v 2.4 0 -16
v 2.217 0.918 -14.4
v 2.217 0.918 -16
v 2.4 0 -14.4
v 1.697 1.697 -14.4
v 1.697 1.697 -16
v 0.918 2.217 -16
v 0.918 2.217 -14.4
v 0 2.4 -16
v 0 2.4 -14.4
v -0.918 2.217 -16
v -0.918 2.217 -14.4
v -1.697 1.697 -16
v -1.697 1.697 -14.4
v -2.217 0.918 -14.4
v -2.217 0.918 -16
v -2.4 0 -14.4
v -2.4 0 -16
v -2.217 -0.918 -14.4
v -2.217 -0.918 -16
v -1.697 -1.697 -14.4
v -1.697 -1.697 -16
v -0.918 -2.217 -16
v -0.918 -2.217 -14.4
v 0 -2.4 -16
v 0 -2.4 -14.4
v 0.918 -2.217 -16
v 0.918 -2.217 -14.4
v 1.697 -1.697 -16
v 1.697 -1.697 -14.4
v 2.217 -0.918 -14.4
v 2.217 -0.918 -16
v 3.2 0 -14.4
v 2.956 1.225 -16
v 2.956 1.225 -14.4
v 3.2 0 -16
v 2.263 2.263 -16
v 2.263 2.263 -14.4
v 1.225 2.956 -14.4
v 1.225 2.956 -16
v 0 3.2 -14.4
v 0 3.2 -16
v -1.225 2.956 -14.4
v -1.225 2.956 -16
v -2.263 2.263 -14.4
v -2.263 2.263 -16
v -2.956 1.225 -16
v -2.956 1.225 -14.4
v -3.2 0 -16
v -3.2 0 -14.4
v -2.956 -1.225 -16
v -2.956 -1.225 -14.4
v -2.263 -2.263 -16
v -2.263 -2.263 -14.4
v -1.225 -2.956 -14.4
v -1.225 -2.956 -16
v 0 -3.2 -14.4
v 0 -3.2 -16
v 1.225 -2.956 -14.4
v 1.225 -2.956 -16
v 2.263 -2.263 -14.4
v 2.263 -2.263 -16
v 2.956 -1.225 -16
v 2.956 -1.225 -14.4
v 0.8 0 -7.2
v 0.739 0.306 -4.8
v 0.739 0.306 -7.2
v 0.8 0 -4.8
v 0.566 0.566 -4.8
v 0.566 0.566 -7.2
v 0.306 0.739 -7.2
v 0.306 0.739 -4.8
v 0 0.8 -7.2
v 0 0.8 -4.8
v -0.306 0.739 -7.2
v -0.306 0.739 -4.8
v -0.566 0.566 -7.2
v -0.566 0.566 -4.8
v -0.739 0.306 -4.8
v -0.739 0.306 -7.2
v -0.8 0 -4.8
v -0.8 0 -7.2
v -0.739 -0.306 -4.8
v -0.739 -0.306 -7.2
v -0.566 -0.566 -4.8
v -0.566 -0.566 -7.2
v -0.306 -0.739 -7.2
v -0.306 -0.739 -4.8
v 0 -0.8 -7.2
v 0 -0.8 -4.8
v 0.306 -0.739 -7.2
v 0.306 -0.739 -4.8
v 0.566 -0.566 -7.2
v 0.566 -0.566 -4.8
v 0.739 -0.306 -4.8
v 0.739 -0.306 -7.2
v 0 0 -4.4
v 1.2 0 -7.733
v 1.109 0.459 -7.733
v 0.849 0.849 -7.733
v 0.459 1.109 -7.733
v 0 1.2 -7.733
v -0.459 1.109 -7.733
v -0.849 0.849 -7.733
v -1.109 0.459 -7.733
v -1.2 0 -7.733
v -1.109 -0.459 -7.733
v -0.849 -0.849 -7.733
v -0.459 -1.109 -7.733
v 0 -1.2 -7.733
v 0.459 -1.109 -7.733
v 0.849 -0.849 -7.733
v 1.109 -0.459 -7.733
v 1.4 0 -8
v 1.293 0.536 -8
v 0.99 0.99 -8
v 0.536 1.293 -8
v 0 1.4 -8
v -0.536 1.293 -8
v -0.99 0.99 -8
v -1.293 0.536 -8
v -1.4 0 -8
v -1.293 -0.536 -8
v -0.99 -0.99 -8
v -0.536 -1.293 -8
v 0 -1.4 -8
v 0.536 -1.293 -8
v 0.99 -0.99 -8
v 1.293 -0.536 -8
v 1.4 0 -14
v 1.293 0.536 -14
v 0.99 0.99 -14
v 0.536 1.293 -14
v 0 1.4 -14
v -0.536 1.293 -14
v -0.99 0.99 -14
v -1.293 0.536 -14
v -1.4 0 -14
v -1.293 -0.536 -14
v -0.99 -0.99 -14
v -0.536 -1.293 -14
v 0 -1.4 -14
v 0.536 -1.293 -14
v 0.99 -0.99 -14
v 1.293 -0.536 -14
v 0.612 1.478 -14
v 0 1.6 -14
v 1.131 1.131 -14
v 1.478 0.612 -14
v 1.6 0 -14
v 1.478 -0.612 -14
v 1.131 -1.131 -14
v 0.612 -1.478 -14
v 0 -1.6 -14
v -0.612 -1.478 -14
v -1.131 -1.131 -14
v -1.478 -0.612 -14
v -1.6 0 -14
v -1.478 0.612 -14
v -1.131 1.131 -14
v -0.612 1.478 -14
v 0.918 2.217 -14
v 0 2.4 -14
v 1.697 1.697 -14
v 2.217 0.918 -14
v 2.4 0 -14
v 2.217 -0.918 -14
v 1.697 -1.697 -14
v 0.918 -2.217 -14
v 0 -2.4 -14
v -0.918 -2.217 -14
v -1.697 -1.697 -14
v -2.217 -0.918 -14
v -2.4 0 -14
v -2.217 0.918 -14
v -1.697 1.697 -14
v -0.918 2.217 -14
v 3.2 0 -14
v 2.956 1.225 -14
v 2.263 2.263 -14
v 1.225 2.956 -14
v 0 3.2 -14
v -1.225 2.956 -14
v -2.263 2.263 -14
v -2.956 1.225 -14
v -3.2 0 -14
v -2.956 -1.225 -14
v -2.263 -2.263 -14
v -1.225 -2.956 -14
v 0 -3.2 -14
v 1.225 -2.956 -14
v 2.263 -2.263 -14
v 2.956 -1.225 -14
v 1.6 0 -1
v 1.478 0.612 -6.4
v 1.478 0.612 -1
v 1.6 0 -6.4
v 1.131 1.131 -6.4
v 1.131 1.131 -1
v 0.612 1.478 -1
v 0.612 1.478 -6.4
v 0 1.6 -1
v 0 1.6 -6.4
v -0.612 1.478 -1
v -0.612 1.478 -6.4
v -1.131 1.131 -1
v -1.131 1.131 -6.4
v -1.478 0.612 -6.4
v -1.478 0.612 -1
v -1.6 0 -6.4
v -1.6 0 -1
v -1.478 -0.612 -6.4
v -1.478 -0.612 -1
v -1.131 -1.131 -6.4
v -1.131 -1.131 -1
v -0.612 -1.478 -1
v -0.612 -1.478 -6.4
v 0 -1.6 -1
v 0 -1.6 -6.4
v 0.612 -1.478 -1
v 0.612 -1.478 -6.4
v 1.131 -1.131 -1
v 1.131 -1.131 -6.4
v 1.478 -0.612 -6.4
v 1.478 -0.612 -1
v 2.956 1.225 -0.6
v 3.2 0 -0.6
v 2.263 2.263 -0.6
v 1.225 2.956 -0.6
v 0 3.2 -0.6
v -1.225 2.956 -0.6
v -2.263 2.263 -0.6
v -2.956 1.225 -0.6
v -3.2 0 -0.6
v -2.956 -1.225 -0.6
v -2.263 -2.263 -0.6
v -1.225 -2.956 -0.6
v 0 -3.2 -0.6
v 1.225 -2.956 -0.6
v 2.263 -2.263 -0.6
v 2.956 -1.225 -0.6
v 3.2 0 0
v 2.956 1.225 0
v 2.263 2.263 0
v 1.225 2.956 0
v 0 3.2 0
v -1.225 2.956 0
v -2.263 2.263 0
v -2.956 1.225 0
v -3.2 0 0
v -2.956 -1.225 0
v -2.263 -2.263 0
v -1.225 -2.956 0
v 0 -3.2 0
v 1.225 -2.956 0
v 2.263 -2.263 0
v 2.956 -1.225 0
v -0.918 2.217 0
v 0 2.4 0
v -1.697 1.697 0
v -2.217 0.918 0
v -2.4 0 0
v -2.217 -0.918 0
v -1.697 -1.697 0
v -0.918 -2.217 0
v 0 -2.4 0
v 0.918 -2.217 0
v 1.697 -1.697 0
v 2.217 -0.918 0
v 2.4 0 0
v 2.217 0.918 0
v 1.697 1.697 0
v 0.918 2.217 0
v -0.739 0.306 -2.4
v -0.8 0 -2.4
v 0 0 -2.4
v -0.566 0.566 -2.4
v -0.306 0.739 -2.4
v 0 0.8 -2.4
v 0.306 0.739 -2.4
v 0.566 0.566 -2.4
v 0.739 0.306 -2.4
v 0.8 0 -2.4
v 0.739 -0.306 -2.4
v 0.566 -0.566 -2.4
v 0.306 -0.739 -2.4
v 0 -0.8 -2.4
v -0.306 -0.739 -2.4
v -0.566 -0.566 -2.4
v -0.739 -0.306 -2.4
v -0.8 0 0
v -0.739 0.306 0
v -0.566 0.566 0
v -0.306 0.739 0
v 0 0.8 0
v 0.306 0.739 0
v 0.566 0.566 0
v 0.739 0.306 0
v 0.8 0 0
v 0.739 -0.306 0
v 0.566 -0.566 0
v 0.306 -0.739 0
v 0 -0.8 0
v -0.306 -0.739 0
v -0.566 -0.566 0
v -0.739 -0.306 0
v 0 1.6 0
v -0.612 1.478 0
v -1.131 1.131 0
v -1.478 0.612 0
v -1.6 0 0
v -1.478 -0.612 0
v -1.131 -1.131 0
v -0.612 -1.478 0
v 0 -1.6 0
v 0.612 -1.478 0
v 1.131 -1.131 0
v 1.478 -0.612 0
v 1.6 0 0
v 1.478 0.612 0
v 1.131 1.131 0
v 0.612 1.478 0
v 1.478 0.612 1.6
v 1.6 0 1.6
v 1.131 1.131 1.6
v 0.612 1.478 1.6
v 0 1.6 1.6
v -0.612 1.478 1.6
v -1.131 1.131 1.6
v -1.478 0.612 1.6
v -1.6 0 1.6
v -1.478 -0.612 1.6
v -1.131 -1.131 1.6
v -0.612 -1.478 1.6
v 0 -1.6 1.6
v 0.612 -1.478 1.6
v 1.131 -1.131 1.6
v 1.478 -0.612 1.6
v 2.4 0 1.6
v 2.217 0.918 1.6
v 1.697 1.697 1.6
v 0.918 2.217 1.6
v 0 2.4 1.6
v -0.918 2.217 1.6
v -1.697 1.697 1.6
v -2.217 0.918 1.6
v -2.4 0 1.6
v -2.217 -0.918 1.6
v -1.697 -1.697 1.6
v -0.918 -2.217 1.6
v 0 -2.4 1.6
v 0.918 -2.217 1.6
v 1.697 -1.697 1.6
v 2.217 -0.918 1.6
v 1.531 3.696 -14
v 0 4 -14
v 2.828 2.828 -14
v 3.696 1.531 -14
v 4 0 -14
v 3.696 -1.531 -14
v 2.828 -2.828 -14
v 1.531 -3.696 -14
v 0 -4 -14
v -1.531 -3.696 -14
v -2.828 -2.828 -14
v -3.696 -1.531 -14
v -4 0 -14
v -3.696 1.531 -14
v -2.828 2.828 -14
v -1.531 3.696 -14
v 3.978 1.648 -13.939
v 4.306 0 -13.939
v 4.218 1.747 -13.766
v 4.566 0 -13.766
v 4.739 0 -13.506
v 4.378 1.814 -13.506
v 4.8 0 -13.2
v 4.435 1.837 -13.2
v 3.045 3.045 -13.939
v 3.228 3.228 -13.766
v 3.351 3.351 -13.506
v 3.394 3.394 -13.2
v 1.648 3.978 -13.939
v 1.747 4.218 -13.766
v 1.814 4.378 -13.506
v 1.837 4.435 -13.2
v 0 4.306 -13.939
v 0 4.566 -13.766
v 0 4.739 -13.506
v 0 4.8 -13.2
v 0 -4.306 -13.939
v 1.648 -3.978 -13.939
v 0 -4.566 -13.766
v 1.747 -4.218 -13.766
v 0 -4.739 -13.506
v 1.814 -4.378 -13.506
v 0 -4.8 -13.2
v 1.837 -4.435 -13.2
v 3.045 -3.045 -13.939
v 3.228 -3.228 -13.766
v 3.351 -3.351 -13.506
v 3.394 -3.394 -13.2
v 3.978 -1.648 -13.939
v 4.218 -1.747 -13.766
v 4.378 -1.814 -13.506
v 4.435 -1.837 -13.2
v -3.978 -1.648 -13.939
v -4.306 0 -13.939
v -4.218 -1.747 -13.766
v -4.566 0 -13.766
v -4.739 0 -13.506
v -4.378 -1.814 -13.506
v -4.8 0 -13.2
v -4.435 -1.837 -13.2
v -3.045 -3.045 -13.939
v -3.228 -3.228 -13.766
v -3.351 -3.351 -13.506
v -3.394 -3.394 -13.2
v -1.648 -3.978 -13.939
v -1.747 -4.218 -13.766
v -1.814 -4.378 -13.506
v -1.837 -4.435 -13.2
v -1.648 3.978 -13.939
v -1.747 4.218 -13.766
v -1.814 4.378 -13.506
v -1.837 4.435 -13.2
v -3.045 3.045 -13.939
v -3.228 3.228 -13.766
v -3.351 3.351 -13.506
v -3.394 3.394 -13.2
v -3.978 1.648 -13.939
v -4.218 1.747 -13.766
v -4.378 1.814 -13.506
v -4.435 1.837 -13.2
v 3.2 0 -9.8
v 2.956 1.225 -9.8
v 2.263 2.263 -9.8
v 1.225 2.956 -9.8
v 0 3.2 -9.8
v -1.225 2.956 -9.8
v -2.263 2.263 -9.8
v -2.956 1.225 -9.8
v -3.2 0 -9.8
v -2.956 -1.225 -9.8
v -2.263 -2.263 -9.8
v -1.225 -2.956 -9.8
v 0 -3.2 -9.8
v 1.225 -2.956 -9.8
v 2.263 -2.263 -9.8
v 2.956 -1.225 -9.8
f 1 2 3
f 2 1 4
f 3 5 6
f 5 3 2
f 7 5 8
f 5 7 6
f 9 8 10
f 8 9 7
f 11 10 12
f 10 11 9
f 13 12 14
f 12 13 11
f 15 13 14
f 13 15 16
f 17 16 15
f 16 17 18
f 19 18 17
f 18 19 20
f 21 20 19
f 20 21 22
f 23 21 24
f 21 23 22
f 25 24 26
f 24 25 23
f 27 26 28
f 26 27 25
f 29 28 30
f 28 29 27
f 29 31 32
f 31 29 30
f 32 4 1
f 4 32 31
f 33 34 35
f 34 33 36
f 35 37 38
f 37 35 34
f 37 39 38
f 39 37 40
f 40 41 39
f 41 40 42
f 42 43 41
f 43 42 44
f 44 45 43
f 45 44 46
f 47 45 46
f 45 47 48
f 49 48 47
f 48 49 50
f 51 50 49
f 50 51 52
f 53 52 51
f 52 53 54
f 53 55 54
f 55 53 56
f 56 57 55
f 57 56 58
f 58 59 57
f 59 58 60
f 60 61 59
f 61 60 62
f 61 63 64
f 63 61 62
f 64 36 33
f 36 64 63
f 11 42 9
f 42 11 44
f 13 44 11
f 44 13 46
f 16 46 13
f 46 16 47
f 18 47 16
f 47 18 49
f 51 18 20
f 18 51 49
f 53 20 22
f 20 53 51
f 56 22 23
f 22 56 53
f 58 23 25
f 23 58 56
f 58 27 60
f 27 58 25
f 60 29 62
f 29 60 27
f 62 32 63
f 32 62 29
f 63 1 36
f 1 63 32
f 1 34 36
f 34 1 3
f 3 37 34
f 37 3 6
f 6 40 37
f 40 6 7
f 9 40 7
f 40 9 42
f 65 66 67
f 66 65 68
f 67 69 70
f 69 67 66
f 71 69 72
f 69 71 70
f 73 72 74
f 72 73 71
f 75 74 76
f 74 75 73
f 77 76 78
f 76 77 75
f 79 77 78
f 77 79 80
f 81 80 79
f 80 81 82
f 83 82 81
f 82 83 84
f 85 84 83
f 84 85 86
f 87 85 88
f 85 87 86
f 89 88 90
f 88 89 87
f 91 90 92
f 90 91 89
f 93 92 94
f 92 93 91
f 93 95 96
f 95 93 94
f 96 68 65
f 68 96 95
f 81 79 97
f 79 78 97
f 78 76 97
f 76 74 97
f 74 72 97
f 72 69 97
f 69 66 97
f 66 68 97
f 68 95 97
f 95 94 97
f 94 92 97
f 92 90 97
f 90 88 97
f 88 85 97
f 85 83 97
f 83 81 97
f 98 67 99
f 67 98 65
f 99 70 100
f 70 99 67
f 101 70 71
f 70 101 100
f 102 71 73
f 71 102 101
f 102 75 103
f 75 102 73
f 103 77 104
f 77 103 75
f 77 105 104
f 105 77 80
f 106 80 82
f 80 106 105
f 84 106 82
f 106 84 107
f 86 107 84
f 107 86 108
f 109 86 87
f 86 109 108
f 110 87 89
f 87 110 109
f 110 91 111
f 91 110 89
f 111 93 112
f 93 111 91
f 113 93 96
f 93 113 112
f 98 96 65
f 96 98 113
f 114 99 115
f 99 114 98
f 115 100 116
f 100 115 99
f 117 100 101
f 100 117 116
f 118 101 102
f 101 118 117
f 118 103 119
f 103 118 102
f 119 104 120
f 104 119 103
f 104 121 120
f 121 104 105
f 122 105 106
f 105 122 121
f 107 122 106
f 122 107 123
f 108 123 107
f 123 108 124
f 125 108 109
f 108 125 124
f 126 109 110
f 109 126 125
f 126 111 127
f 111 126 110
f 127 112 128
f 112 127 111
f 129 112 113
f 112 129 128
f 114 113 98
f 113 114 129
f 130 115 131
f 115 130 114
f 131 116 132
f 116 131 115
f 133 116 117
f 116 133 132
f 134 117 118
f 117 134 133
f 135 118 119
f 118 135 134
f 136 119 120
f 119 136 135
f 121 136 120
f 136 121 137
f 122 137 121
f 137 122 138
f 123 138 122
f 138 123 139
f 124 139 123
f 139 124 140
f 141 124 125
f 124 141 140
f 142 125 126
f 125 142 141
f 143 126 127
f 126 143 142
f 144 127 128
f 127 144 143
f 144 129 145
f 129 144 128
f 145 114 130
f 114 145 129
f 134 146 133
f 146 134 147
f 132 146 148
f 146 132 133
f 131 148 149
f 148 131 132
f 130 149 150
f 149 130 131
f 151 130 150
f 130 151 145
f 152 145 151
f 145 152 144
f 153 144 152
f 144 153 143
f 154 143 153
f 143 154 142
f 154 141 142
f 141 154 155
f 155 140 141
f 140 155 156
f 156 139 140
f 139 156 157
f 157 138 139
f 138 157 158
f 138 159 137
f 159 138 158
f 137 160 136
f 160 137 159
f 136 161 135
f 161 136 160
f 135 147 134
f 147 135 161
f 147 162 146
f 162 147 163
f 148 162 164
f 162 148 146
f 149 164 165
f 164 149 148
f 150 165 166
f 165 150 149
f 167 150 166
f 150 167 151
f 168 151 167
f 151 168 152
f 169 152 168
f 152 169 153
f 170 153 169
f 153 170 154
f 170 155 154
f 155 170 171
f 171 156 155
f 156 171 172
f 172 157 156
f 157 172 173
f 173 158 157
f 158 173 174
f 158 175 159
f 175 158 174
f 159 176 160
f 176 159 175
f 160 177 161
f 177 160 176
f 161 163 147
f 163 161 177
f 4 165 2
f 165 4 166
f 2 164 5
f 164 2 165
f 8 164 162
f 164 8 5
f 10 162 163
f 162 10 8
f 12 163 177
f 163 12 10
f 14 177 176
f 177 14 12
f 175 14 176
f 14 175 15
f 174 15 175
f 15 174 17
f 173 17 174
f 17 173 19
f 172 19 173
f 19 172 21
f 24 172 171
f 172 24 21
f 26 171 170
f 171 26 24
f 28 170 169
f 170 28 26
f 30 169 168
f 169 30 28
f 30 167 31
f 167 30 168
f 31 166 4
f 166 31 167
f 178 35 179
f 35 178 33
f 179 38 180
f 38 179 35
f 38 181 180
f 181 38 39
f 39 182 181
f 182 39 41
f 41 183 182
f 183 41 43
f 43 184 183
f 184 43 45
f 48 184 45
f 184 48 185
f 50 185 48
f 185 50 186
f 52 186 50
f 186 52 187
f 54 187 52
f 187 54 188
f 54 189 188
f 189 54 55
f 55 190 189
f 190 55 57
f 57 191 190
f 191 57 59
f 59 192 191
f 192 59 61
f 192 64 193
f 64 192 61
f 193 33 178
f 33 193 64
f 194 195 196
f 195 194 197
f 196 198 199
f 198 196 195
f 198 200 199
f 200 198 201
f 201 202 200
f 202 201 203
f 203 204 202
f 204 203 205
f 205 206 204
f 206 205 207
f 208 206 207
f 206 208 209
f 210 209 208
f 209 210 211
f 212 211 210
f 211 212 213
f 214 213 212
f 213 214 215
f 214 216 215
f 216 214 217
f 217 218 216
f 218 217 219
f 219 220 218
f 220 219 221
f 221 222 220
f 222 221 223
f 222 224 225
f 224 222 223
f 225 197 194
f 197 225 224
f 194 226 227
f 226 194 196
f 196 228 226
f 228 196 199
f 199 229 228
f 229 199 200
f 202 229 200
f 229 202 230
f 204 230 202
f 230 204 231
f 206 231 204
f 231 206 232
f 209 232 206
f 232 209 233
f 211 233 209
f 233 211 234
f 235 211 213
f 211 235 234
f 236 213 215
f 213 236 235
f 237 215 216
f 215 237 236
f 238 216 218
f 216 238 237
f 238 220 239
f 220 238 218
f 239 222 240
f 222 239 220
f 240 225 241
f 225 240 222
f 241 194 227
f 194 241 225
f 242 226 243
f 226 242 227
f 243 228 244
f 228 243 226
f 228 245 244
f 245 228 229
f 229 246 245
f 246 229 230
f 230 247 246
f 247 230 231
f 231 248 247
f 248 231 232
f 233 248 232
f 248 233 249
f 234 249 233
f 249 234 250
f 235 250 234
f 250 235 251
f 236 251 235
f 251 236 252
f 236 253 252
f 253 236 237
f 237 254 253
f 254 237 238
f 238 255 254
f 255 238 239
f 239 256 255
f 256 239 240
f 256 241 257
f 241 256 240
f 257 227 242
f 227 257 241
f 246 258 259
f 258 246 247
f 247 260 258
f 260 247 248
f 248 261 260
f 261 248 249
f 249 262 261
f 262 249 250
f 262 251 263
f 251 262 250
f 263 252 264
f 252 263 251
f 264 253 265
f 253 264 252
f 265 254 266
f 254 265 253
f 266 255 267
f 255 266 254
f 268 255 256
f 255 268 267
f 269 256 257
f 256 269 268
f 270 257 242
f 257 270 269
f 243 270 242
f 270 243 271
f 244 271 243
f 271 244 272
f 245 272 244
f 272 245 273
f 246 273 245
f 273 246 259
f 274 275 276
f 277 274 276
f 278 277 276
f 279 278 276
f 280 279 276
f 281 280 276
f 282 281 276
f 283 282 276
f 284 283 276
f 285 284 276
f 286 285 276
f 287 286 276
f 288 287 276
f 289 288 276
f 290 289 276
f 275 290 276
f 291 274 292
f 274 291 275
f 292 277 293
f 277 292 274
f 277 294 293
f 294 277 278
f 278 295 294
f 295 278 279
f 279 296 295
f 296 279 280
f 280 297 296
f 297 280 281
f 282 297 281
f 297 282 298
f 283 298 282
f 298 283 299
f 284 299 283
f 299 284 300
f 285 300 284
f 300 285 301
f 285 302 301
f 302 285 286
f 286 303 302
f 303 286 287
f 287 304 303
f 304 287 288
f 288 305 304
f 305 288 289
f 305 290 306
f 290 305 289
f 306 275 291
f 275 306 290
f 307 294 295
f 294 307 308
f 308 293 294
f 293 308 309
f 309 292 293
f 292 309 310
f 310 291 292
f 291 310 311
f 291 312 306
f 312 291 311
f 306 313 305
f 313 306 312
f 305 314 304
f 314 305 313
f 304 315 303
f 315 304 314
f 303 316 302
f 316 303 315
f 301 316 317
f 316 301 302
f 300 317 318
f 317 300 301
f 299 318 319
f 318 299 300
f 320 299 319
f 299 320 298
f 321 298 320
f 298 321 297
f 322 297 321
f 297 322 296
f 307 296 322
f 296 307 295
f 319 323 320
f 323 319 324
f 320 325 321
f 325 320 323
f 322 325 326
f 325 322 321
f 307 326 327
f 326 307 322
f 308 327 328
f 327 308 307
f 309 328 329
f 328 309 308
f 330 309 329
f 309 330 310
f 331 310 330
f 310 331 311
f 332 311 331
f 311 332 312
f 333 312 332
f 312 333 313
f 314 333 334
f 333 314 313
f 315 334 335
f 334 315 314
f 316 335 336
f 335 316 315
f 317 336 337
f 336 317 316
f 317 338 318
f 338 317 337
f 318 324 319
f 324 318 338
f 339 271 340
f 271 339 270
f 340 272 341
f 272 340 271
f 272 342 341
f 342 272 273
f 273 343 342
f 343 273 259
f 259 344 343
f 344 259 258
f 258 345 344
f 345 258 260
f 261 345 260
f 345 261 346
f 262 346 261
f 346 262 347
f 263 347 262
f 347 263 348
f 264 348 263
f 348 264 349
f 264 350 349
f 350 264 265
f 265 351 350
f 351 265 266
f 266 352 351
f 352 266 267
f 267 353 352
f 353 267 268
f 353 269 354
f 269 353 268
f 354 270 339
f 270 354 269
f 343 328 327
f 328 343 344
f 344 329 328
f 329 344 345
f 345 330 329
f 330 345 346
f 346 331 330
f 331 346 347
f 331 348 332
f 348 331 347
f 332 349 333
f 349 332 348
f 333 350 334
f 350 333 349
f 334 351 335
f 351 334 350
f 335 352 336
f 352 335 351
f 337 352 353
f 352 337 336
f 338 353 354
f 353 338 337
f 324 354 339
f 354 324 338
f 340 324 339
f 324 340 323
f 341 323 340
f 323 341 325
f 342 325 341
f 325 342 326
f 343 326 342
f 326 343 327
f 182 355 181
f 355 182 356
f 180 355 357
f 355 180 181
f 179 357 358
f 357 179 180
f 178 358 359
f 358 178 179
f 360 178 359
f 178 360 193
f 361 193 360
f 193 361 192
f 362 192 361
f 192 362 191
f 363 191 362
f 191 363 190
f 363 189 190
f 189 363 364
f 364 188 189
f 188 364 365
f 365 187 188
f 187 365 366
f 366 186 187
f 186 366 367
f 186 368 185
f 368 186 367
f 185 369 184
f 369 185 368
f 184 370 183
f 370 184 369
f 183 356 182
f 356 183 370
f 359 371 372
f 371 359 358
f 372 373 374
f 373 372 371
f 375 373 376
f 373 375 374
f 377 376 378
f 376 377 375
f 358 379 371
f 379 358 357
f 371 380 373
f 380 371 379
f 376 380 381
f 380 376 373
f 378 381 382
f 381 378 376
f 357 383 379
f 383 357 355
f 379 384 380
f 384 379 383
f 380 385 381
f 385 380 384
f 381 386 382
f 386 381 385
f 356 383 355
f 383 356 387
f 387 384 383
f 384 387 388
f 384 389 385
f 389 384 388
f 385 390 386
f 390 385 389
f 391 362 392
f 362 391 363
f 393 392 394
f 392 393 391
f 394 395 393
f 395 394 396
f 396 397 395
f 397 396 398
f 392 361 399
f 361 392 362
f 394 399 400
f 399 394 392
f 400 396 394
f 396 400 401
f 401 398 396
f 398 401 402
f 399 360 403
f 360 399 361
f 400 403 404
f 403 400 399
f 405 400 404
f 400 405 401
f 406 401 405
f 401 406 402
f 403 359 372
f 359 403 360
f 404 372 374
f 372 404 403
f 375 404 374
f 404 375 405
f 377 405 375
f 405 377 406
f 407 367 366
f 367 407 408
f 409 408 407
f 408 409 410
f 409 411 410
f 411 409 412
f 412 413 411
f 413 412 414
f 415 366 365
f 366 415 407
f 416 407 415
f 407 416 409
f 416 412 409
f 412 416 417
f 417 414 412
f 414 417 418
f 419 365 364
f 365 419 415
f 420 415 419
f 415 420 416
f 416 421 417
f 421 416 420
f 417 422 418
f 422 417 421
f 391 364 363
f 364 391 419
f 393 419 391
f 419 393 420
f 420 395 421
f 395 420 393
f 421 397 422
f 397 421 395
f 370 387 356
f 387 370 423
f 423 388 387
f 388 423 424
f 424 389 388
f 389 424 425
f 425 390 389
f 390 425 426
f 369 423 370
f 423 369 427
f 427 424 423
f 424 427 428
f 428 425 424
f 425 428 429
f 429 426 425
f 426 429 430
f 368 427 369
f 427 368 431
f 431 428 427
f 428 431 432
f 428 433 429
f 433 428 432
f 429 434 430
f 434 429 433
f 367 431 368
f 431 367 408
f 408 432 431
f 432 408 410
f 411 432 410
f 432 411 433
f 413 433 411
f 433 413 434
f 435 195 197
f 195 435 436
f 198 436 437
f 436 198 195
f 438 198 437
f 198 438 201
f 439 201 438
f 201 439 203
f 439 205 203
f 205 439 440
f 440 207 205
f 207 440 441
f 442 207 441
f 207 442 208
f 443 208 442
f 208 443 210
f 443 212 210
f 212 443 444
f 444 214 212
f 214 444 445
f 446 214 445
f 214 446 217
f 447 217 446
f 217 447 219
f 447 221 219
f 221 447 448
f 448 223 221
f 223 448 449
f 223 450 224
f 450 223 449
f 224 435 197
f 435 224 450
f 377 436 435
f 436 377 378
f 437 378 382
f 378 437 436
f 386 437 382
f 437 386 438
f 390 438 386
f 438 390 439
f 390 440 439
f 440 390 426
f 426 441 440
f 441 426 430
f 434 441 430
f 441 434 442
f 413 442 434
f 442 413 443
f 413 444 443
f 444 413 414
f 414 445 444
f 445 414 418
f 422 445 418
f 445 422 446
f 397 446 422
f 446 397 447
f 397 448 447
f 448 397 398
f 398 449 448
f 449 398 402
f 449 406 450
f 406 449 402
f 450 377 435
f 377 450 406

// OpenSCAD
use <../lib.scad>
use <s/u9180s01.scad>
use <s/u9180s02.scad>
function ldraw_lib__93549() = [
// 0 ~_Minifig Conical Flask [47/35] (Obsolete)
// 0 Name: 93549.dat
// 0 Author: Magnus Forsberg [MagFors]
// 0 !LDRAW_ORG Part Physical_Colour UPDATE 2019-02
// 0 !LICENSE Licensed under CC BY 4.0 : see CAreadme.txt
// 
// 0 BFC CERTIFY CCW
  [0,"BFC","CERTIFY"],
  [0,"BFC","CCW"],
// 
// 0 !CATEGORY Obsolete
// 
// 0 !HISTORY 2011-06-13 [cwdee] Rework nomenclature
// 0 !HISTORY 2012-01-25 [MagFors] Inlined hardcoded subfiles
// 0 !HISTORY 2012-08-09 [PTadmin] Official Update 2012-02
// 0 !HISTORY 2012-08-11 [cwdee] Re-issue due to ommission from early downloads of 2012-02
// 0 !HISTORY 2012-12-28 [PTadmin] Official Update 2012-03
// 0 !HISTORY 2019-08-14 [cwdee] Obsoleted per decision not to include physical colour parts
// 0 !HISTORY 2019-09-09 [PTadmin] Official Update 2019-02
// 
// 
// 1 47 0 0 0 1 0 0 0 1 0 0 0 1 s\u9180s01.dat
  [1,47,0,0,0,1,0,0,0,1,0,0,0,1, ldraw_lib__s__u9180s01()],
// 1 35 0 0 0 1 0 0 0 1 0 0 0 1 s\u9180s02.dat
  [1,35,0,0,0,1,0,0,0,1,0,0,0,1, ldraw_lib__s__u9180s02()],
];
module ldraw_lib__93549(step=0, col=false, unit=2/5, alt=false, line=0.2, solid=!$preview)
    makepoly(ldraw_lib__93549(), step=step, col=col, unit=unit, alt=alt, line=line, solid=solid);
ldraw_lib__93549(line=0.2);
